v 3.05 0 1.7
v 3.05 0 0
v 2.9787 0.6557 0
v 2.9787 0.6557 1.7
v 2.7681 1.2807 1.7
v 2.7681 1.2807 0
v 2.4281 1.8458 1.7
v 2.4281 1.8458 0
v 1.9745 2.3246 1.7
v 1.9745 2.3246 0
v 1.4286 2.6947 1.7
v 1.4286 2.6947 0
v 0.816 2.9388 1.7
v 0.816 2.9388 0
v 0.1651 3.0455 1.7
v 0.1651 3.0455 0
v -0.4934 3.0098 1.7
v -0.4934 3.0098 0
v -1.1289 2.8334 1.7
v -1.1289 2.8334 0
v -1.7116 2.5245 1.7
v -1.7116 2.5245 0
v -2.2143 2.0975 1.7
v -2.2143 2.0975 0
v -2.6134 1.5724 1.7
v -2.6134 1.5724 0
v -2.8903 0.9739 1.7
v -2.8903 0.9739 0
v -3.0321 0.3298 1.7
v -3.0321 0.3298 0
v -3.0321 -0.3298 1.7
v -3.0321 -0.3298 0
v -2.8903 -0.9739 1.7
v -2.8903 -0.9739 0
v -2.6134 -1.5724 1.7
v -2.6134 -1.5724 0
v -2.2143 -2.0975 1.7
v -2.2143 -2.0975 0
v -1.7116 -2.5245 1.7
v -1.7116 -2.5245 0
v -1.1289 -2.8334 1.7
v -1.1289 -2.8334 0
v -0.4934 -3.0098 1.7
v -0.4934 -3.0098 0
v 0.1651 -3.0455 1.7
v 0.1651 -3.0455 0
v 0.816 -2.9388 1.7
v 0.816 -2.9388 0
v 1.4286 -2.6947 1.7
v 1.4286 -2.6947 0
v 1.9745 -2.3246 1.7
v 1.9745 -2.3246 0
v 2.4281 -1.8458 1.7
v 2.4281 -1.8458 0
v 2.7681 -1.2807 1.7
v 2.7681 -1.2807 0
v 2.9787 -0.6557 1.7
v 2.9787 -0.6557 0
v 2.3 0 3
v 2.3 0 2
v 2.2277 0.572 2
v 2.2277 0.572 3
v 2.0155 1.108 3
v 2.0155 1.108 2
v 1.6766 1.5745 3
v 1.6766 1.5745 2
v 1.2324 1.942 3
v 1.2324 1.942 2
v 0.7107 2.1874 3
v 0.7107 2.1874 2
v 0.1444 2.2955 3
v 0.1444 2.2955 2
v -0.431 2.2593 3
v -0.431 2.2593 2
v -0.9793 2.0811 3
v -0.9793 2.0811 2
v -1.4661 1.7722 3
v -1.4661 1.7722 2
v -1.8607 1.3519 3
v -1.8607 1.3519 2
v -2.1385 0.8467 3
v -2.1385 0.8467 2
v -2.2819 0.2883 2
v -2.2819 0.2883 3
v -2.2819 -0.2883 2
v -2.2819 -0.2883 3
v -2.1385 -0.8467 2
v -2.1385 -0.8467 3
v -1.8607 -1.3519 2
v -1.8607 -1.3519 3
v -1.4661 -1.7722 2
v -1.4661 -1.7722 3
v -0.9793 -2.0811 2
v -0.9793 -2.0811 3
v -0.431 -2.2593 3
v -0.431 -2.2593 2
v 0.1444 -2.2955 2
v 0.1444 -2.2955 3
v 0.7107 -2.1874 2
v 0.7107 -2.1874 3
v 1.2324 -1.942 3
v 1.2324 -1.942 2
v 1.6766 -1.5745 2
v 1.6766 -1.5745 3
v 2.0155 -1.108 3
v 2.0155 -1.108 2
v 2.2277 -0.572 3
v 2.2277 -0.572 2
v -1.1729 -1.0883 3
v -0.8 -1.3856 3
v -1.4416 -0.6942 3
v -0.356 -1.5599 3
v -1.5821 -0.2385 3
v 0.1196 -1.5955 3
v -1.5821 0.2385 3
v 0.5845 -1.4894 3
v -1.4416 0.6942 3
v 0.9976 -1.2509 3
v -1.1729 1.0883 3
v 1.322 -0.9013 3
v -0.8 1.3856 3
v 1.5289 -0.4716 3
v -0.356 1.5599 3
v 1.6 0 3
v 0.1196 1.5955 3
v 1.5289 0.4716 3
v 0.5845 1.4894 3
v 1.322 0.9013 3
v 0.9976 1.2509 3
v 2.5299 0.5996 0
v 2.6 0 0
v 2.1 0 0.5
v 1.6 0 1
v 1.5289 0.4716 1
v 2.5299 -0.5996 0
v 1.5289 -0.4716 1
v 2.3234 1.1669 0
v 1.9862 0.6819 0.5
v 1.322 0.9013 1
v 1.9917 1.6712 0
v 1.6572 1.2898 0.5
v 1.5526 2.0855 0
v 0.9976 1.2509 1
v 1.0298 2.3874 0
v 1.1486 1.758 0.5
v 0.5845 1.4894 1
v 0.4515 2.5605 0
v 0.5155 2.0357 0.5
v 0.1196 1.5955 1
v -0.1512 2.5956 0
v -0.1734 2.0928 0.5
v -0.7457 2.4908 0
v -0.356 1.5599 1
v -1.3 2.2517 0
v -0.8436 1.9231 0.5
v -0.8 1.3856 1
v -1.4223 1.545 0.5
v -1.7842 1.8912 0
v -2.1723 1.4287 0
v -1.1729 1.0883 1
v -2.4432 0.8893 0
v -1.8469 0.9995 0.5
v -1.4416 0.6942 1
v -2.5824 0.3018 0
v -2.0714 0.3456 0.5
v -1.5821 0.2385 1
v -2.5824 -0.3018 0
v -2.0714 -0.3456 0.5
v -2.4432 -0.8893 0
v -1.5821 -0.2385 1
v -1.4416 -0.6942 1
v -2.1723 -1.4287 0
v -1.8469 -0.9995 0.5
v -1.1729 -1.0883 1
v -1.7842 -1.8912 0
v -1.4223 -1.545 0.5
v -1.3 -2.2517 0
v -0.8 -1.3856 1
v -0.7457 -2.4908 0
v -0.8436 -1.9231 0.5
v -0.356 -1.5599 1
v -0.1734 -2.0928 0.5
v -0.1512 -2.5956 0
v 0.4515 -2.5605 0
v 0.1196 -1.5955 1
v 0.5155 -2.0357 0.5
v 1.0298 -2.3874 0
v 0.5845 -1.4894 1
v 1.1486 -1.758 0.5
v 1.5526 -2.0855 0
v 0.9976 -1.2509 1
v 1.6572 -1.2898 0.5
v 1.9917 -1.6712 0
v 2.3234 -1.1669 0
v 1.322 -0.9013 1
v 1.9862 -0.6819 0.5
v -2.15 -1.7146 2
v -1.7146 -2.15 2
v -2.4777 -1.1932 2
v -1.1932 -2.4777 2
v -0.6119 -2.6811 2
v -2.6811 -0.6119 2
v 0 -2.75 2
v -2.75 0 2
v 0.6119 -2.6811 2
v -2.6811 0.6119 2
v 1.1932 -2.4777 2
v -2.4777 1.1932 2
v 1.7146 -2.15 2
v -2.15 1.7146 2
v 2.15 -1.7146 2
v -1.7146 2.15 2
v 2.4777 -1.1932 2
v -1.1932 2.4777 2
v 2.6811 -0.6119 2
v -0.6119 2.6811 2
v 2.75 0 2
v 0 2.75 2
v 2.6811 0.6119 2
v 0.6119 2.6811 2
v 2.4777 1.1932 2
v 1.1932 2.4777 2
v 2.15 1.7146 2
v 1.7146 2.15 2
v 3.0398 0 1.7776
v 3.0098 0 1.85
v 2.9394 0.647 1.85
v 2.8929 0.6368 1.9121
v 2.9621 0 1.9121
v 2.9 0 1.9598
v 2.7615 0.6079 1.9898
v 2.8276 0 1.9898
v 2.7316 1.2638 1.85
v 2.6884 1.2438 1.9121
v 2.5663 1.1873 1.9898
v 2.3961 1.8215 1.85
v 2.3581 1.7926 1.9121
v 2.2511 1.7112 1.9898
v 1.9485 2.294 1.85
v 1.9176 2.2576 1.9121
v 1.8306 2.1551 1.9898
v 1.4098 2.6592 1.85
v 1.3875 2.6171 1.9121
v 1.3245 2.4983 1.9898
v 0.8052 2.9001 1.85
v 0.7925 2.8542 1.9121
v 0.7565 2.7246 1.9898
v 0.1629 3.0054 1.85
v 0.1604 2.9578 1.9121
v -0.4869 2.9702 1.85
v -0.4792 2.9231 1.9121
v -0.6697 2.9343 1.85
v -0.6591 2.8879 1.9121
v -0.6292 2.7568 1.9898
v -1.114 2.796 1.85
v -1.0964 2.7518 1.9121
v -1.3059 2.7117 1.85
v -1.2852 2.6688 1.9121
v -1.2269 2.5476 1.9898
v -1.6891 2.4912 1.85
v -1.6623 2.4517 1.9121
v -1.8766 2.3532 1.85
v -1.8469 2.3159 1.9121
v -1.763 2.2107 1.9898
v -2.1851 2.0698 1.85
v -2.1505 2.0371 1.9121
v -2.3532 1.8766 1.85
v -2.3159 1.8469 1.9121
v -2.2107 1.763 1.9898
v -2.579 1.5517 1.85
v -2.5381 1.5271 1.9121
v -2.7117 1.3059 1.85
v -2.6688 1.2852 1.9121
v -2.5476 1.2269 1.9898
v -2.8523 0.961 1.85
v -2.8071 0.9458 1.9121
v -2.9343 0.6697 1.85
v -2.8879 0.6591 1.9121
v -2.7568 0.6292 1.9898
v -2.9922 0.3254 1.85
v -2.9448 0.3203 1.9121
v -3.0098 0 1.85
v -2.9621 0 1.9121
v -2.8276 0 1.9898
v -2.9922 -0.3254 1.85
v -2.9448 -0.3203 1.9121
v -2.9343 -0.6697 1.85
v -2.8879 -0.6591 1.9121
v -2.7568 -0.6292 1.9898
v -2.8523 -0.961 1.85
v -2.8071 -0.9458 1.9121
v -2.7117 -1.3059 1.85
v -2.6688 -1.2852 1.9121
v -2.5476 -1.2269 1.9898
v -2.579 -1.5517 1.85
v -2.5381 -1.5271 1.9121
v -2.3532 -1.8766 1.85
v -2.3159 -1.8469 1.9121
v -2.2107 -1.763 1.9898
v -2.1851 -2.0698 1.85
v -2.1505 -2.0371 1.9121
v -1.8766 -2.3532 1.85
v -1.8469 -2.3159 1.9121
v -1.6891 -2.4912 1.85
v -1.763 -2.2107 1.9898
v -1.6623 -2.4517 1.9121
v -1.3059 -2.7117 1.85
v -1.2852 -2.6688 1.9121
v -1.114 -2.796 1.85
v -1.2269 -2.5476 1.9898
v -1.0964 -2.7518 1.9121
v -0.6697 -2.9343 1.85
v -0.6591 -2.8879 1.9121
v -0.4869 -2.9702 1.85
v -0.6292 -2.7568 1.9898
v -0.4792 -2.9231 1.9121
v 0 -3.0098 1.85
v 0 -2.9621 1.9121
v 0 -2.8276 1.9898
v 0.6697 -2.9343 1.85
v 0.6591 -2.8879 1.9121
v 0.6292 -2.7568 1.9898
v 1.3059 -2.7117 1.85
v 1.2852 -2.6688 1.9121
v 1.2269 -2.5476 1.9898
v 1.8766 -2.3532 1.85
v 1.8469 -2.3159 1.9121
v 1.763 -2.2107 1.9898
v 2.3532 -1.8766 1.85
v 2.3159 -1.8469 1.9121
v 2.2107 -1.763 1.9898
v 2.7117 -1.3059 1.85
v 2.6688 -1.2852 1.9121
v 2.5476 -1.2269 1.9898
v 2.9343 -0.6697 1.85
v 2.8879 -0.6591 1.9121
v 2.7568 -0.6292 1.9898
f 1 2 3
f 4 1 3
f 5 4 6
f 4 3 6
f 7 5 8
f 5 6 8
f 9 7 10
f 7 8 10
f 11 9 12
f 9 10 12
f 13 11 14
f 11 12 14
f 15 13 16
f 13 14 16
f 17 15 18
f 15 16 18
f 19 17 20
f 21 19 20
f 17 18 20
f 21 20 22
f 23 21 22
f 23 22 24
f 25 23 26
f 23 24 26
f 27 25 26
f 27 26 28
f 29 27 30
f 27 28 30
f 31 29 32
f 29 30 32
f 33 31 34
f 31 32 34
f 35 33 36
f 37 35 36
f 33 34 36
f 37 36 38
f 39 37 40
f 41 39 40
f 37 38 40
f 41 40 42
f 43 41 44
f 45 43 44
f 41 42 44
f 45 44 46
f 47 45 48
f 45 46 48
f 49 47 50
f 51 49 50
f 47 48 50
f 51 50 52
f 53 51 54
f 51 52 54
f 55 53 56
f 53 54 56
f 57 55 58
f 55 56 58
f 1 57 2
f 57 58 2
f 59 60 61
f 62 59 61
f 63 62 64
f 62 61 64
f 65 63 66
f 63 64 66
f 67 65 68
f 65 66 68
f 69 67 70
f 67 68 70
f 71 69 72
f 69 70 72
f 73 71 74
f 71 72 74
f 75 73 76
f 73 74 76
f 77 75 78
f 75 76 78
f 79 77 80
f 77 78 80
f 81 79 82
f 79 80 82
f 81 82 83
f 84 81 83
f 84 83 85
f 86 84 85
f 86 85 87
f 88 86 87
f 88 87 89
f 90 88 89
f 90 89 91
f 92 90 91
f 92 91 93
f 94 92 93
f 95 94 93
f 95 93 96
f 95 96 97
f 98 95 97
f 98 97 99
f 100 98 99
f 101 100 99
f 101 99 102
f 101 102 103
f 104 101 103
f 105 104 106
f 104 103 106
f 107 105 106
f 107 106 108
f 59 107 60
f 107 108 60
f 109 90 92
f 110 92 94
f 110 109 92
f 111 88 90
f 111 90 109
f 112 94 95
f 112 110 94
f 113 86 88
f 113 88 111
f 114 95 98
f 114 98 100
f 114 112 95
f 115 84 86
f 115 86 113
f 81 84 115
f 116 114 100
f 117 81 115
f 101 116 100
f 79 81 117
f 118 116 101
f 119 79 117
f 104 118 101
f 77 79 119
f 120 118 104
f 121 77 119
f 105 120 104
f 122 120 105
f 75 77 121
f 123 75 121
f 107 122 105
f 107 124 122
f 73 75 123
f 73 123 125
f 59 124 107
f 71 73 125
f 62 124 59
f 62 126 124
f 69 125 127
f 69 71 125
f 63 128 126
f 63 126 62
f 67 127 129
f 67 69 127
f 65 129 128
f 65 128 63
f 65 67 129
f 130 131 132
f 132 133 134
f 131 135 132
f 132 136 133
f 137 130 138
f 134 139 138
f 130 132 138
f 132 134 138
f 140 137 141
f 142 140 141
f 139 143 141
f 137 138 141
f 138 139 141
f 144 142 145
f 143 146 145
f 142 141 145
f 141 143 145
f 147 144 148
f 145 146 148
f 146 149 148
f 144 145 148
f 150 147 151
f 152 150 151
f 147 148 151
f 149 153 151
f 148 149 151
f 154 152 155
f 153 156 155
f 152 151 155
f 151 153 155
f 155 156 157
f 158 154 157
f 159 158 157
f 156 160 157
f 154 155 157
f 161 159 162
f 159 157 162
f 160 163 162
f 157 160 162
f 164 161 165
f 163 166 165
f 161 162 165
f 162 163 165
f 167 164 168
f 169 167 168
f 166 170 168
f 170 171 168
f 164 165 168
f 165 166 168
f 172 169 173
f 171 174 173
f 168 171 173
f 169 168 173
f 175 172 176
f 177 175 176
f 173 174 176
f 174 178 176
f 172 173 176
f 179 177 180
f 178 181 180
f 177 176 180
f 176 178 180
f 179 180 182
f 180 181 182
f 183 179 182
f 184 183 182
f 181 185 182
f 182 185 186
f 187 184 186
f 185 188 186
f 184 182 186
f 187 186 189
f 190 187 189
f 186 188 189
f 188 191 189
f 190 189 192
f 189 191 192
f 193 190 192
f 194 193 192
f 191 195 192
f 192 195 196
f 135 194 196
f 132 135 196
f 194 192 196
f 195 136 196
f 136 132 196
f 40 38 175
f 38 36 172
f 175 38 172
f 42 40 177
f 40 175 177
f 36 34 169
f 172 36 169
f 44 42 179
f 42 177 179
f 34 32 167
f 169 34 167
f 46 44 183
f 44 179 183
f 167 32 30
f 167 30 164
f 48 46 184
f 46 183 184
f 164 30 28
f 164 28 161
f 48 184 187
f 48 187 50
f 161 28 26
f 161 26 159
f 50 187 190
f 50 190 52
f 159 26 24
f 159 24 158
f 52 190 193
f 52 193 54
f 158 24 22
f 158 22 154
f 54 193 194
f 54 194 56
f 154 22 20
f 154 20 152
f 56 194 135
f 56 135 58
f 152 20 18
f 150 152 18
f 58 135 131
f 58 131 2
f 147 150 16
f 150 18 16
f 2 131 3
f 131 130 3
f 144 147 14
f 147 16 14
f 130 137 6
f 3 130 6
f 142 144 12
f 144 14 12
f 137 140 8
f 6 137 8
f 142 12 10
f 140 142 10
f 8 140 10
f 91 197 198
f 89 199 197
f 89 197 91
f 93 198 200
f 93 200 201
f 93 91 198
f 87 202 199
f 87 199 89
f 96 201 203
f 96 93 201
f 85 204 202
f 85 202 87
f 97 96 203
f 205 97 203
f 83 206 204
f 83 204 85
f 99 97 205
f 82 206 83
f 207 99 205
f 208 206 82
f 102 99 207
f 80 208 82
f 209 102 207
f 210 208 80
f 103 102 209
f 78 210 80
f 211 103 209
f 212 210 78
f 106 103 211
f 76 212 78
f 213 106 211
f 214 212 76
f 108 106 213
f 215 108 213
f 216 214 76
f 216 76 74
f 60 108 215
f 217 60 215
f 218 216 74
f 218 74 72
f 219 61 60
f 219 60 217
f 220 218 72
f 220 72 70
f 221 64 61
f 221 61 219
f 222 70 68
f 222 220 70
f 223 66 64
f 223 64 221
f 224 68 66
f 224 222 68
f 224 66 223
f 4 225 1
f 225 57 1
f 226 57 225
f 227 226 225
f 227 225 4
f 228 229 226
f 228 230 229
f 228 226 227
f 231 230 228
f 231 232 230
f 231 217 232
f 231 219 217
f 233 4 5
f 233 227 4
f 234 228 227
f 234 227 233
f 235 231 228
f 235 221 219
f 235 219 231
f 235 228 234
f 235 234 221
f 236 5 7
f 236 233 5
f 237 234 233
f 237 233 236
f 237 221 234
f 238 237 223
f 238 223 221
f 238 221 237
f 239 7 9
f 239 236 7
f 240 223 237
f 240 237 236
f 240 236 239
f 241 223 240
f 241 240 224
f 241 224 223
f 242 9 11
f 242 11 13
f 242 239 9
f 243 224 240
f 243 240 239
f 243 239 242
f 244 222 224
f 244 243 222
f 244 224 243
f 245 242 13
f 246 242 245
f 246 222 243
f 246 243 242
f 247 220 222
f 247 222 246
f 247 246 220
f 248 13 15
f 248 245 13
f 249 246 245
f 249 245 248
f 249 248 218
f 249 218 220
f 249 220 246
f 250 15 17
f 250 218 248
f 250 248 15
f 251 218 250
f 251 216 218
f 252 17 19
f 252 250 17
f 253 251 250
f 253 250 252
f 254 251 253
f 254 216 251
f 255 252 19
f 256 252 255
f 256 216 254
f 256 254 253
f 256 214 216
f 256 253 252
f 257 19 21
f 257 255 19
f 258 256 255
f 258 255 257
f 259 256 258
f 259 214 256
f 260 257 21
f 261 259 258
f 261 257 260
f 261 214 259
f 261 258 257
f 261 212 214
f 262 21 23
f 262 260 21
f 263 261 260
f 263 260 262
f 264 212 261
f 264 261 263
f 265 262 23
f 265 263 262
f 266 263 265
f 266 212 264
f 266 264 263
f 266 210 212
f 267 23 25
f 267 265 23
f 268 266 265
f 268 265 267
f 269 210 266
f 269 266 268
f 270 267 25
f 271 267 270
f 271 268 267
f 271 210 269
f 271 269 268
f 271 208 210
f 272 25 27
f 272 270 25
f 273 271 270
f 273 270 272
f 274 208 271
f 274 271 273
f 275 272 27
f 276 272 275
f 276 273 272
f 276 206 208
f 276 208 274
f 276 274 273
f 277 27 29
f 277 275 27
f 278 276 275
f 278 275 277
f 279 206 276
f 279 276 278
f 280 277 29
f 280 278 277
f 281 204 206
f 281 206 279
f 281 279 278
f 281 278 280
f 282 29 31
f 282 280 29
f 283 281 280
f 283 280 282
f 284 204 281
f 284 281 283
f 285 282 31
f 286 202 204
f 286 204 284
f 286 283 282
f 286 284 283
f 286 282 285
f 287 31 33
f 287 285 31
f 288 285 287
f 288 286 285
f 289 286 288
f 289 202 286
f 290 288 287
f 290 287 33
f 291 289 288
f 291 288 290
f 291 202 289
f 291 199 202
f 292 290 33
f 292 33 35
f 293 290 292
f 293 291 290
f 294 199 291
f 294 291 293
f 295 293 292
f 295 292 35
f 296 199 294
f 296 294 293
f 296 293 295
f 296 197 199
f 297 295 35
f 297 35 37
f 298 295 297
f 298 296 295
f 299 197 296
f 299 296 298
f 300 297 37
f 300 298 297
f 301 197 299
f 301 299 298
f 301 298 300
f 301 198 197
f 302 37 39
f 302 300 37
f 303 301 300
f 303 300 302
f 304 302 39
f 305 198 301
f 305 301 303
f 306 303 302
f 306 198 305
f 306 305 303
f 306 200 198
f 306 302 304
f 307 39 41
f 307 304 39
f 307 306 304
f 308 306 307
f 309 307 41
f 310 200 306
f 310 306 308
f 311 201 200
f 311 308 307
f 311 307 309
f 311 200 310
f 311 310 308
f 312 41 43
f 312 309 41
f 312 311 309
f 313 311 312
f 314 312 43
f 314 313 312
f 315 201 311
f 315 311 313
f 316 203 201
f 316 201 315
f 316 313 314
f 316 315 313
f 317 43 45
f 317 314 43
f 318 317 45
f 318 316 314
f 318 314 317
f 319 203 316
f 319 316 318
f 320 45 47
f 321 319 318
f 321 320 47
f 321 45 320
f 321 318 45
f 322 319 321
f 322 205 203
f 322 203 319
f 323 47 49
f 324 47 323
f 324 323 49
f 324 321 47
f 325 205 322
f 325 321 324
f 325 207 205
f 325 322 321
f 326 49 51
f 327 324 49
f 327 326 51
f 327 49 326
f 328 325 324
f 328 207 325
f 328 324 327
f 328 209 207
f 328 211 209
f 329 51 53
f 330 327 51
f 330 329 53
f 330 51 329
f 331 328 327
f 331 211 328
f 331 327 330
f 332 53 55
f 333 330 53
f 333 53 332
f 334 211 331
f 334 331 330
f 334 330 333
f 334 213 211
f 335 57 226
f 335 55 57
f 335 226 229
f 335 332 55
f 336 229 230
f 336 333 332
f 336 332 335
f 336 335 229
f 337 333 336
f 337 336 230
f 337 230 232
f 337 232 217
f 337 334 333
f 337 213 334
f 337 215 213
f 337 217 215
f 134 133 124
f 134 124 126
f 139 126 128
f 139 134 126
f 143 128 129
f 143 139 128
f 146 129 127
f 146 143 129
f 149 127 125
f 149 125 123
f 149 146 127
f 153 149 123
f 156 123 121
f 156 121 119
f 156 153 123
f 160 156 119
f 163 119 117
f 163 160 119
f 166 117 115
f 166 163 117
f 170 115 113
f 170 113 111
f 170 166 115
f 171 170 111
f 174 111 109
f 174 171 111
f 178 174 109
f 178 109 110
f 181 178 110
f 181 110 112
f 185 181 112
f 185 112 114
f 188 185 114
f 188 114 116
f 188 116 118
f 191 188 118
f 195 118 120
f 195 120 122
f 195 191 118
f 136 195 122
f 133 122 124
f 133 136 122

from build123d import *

# Parameters (mm, degrees)
F0_R     = 2.3
F0_R_2   = 1.6
F1_DEPTH = 3
F0_R_3   = 3.05
F2_DEPTH = 2
F3_R     = 0.3
F4_SIZE  = 1


with BuildPart() as f1:
    # F0 (on Top) → F1 (new body)
    with BuildSketch(Plane.XY):
        Circle(F0_R)
        Circle(F0_R_2, mode=Mode.SUBTRACT)
    extrude(amount=F1_DEPTH)

    # F0 (on Top) → F2 (join)
    with BuildSketch(Plane.XY):
        Circle(F0_R_3)
        Circle(F0_R, mode=Mode.SUBTRACT)
    extrude(amount=F2_DEPTH)

    # F3
    f3_edges = [f1.edges().sort_by_distance(p)[0] for p in [
        (-3.05, 0, 2),
    ]]
    fillet(f3_edges, radius=F3_R)

    # F4
    f4_edges = [f1.edges().sort_by_distance(p)[0] for p in [
        (-1.6, 0, 0),
    ]]
    chamfer(f4_edges, length=F4_SIZE)


solid = f1.part
